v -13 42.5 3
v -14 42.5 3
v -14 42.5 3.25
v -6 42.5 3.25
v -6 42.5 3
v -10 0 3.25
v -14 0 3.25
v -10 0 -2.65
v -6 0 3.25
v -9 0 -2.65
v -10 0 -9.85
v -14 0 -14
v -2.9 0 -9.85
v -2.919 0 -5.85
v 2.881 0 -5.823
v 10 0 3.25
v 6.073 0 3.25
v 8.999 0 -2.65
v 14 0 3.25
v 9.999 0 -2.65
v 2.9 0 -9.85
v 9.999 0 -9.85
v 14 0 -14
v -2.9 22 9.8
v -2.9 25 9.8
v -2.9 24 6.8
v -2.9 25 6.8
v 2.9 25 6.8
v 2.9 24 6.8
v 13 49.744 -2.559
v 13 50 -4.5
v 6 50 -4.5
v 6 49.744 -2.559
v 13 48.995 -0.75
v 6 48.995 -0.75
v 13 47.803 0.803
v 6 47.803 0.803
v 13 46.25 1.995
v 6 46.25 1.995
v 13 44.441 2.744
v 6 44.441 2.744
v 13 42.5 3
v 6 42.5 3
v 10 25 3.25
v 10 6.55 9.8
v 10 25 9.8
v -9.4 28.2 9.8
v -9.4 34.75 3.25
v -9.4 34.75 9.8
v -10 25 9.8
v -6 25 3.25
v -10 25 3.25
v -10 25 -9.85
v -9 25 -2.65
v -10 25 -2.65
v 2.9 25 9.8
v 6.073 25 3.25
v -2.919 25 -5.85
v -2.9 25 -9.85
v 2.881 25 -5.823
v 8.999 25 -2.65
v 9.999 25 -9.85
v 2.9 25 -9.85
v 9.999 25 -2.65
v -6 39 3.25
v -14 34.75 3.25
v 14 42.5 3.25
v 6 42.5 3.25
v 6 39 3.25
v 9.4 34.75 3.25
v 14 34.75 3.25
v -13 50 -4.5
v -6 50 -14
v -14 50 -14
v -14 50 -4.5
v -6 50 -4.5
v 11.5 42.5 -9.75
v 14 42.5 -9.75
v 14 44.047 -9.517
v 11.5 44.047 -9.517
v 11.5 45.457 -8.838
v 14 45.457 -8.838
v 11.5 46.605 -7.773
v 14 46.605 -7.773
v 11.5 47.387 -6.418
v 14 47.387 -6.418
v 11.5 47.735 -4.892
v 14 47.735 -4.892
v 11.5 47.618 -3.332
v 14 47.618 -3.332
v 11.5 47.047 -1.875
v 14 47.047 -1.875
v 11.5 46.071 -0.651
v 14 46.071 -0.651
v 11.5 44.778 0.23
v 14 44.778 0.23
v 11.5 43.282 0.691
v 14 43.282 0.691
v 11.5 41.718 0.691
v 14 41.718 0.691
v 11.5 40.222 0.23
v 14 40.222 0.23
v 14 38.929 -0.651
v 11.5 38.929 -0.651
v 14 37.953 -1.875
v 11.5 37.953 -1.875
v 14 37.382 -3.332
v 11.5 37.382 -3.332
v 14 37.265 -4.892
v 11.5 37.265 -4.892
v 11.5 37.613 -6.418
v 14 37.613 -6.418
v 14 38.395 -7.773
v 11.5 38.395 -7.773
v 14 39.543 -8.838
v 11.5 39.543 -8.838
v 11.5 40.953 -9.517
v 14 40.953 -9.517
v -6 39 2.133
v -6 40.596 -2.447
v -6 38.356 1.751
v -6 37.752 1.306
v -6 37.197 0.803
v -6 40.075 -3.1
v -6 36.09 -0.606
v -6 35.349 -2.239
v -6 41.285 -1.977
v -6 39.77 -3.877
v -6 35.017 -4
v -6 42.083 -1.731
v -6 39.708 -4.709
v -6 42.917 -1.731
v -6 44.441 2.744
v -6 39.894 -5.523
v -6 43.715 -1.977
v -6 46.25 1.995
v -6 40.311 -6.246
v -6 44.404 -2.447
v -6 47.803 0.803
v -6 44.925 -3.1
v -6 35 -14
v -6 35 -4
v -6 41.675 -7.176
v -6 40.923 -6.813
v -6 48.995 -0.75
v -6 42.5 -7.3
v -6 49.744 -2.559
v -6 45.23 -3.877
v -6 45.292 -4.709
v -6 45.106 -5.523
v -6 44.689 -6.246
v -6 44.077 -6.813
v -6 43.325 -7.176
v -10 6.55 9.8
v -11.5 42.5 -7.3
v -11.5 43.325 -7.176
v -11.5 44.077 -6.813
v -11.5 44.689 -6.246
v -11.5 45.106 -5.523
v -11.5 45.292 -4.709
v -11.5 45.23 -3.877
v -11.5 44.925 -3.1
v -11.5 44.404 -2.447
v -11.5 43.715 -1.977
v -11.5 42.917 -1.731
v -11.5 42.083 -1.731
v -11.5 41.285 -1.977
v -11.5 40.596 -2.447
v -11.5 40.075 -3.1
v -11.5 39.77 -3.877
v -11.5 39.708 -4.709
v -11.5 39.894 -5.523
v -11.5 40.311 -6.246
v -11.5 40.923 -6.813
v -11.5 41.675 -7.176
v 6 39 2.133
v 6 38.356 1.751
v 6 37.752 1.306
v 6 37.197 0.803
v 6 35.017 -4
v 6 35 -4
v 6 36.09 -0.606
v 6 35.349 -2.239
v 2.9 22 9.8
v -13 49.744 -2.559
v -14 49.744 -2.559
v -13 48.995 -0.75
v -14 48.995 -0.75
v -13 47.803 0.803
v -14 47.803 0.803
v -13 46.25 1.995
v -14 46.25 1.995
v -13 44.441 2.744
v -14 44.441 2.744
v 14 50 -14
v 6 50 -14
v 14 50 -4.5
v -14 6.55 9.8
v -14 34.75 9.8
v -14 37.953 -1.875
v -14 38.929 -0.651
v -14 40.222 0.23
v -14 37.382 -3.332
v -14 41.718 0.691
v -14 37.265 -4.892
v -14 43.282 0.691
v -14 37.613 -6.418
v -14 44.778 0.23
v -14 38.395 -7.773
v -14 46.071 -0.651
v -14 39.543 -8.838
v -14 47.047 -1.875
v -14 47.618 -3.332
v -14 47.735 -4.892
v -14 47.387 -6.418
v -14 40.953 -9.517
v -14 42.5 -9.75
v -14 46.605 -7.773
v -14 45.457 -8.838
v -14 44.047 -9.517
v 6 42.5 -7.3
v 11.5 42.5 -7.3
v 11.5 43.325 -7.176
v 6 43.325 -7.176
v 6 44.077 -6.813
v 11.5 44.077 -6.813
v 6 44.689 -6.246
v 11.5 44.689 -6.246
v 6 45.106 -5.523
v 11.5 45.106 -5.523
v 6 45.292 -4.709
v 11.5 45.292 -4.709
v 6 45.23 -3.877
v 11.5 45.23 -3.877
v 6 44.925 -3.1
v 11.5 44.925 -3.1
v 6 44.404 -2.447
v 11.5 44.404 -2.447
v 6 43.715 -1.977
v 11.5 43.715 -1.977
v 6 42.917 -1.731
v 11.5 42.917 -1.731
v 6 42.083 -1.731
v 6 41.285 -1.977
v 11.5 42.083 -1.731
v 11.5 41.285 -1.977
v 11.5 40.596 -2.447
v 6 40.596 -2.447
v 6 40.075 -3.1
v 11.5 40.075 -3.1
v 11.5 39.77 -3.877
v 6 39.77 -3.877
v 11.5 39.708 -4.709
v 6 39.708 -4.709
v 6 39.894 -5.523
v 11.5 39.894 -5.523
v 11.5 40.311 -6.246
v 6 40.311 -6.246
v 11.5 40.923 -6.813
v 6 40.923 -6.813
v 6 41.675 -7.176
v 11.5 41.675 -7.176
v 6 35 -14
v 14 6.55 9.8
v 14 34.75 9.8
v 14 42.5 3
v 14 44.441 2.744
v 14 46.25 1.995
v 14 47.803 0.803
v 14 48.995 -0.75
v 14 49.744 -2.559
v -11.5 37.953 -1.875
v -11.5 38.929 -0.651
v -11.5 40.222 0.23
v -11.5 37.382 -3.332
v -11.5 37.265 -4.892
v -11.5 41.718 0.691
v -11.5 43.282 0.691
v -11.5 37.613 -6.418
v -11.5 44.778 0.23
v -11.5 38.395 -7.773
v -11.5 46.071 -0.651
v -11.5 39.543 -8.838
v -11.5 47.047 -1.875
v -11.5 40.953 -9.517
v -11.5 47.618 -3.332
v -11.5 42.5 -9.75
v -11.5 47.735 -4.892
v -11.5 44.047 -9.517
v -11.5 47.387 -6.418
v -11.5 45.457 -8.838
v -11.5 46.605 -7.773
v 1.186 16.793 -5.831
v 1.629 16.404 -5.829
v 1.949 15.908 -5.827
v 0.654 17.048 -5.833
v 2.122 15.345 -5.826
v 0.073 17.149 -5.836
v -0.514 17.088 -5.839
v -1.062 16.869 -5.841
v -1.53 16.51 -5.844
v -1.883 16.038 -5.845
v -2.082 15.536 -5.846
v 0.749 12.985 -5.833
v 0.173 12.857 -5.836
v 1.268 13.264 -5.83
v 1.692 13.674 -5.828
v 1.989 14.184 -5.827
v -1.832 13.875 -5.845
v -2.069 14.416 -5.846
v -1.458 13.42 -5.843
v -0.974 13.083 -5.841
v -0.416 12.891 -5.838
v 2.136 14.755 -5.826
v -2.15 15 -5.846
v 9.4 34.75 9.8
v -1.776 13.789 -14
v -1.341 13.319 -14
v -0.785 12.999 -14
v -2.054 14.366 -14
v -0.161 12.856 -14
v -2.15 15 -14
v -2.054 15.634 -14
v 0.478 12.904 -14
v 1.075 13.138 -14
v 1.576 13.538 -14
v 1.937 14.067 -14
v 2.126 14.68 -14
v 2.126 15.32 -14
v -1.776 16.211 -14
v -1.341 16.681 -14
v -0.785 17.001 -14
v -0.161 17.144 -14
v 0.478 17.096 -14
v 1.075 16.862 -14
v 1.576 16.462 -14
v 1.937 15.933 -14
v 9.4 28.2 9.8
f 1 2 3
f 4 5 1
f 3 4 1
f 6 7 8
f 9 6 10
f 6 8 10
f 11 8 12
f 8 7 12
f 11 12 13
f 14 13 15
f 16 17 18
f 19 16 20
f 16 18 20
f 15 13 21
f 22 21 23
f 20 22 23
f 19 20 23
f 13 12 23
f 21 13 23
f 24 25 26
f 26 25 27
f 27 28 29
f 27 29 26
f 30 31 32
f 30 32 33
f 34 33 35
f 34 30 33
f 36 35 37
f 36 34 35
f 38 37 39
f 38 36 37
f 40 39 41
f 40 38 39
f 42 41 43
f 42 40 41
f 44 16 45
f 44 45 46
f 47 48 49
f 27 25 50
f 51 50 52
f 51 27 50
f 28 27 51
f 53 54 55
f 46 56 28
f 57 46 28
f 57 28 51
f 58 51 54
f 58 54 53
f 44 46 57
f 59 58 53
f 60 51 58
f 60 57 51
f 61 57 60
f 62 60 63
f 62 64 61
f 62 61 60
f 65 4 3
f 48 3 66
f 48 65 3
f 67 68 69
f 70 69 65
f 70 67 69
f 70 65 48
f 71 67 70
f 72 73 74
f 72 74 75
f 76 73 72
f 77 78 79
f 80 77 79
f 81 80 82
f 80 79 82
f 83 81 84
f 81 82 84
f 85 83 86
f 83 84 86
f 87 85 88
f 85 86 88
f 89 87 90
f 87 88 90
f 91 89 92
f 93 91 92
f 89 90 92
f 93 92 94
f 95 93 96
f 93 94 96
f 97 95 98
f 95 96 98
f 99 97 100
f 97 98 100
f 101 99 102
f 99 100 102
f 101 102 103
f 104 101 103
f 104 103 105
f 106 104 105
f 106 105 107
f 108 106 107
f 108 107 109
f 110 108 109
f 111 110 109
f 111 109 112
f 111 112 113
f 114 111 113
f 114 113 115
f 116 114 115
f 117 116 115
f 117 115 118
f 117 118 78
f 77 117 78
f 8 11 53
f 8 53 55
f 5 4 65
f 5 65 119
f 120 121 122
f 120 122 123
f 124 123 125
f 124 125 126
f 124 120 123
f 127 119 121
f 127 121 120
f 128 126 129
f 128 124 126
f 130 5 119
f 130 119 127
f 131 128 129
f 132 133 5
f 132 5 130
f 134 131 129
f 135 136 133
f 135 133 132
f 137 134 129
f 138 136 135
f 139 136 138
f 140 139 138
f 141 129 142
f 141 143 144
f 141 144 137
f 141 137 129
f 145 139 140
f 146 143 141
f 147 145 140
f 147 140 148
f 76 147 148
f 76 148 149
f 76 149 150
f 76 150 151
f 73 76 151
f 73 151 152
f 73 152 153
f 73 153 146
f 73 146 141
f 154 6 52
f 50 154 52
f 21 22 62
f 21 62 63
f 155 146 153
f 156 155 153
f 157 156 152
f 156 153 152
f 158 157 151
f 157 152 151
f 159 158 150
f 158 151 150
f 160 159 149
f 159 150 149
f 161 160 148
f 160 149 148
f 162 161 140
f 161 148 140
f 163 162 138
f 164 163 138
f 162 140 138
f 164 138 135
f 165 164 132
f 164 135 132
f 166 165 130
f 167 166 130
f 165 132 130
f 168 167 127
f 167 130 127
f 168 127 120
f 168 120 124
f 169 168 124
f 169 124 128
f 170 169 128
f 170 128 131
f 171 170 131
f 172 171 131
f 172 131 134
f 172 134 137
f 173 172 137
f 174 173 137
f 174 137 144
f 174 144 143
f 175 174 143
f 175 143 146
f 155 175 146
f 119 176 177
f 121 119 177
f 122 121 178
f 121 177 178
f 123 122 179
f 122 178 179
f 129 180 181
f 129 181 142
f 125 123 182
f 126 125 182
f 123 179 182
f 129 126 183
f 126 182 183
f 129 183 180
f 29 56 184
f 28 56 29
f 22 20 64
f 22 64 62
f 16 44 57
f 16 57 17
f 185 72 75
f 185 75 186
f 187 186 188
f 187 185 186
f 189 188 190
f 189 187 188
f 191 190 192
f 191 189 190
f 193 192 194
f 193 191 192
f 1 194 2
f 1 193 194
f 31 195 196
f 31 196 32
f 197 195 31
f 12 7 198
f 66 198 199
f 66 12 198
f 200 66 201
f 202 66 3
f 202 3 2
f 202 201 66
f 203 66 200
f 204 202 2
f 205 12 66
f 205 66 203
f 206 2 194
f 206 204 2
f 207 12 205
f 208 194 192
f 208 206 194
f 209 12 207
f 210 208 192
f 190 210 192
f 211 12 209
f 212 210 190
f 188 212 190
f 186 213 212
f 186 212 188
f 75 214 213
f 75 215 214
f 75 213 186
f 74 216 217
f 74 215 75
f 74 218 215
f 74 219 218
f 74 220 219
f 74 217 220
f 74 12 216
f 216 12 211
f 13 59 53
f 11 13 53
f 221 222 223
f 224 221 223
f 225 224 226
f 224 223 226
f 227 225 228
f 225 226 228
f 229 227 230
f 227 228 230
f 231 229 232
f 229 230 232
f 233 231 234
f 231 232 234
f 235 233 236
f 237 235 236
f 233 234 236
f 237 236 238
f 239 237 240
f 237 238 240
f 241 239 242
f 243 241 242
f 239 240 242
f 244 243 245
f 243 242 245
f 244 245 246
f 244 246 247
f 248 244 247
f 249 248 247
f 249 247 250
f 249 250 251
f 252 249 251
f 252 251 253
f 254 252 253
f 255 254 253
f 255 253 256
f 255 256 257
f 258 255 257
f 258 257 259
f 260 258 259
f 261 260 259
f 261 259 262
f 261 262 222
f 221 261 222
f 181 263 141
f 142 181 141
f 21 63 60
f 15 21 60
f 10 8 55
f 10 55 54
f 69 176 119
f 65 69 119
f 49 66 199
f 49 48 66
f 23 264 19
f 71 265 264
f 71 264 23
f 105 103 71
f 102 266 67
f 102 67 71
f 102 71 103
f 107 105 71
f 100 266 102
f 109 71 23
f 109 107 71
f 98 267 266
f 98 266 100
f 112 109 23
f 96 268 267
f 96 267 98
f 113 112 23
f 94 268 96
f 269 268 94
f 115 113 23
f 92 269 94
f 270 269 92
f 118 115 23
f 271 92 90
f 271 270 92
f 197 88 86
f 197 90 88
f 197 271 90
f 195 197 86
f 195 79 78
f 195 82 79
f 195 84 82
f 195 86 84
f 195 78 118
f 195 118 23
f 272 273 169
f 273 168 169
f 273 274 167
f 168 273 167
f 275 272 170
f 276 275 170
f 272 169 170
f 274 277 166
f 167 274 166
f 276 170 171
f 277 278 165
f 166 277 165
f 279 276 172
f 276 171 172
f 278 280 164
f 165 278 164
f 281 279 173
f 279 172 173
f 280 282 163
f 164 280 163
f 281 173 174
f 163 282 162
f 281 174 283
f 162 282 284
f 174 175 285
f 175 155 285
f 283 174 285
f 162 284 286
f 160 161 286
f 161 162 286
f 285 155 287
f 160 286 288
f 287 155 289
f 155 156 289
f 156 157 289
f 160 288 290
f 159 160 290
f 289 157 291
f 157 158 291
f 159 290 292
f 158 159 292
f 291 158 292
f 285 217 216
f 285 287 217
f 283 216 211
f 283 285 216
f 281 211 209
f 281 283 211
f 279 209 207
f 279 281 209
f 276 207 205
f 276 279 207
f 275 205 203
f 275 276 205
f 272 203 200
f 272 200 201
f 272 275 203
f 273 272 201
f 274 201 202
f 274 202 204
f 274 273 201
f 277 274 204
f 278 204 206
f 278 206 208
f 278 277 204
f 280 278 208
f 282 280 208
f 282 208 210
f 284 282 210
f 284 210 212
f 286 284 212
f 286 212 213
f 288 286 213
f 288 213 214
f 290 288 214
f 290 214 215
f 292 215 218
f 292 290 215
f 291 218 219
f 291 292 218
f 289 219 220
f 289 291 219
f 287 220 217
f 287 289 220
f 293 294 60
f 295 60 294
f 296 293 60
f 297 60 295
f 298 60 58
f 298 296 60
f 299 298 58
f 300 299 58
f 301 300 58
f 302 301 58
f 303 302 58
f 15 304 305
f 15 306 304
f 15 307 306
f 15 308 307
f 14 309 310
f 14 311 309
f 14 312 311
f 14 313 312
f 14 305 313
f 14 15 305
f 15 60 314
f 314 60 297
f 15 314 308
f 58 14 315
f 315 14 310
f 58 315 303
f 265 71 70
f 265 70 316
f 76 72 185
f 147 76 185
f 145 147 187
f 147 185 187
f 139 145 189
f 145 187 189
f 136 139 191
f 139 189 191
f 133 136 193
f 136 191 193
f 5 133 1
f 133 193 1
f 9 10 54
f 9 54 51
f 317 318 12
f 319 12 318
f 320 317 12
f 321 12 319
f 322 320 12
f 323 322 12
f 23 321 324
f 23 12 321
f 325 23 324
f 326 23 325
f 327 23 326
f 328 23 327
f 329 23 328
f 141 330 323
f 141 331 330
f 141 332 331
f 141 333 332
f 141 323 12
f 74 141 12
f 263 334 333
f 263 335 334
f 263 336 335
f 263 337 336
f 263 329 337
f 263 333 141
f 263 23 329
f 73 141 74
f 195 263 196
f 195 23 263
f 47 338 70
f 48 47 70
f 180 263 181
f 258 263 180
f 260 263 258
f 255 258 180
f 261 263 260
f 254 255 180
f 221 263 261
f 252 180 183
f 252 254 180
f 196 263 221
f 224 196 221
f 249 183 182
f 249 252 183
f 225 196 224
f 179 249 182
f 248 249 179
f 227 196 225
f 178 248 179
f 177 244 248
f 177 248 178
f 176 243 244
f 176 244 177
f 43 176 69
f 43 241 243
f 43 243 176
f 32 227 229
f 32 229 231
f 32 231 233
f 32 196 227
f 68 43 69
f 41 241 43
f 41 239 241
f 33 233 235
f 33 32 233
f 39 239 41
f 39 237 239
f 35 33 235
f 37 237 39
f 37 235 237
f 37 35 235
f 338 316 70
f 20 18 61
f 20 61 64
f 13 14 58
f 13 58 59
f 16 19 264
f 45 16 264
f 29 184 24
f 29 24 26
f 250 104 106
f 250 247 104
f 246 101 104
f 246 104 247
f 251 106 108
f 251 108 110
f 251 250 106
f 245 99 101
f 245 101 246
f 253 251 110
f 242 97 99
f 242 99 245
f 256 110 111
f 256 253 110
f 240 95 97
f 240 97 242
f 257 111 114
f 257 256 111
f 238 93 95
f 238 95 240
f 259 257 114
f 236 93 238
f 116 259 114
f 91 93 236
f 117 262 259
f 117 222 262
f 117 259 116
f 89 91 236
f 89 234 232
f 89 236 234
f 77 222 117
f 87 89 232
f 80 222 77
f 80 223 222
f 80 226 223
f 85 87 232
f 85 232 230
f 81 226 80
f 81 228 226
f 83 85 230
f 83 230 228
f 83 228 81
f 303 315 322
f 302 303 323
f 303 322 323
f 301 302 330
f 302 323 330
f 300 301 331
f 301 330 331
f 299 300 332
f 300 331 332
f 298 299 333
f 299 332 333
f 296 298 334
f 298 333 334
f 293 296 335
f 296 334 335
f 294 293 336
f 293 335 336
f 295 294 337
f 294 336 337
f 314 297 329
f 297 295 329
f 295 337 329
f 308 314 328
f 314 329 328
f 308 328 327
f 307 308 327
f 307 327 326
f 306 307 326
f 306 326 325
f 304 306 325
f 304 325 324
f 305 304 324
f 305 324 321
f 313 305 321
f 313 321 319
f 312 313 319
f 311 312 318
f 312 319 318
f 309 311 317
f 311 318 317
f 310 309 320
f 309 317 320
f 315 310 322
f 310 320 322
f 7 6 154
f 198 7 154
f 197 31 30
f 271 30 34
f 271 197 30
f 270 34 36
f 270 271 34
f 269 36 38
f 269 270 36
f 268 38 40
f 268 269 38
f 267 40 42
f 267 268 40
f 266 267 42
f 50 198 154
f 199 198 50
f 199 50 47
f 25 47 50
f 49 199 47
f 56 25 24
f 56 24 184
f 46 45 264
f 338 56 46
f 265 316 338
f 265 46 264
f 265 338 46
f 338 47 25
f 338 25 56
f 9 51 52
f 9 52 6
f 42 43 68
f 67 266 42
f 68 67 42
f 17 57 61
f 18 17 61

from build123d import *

# Parameters (mm, degrees)
SKETCH1_W                    = 26
SKETCH1_H                    = 28
BOSS_EXTRUDE1_DEPTH          = 50
CUT_EXTRUDE6_DEPTH           = 25
CUT_EXTRUDE3_DEPTH           = 39
SKETCH14_R                   = 7.5
BOSS_EXTRUDE7_DEPTH          = 7
SKETCH15_R                   = 2.8
CUT_EXTRUDE4_DEPTH           = 28
SKETCH16_R                   = 5.25
CUT_EXTRUDE5_DEPTH           = 1.5
CUT_EXTRUDE7_DEPTH           = 54.525694764
SKETCH19_R                   = 2.15
CUT_EXTRUDE9_DEPTH           = 50
ESQUISSE1_W                  = 12
ESQUISSE1_H                  = 9.5
ENL_V_MAT_EXTRU_1_DEPTH      = 7.5
ESQUISSE3_W                  = 12
ESQUISSE3_H                  = 7.5
ENL_V_MAT_EXTRU_3_DEPTH      = 10
BOSS_EXTRU_1_DEPTH           = 26
ENL_V_MAT_EXTRU_5_DEPTH      = 3.5
ESQUISSE9_W                  = 5.8
ESQUISSE9_H                  = 3
BOSS_EXTRU_3_DEPTH           = 1
BOSS_EXTRU_4_DEPTH           = 5.8
BOSS_EXTRU_5_DEPTH           = 0.1
BOSS_EXTRU_6_DEPTH           = 0.1
ESQUISSE13_W                 = 6.55
ESQUISSE13_H                 = 9.75
BOSS_EXTRU_7_DEPTH           = 3.6
ESQUISSE14_W                 = 6.55
ESQUISSE14_H                 = 9.75
BOSS_EXTRU_8_DEPTH           = 3.6
ESQUISSE16_R                 = 5.25
BOSS_EXTRU_9_DEPTH           = 1
BOSS_EXTRU_10_START          = 1
ESQUISSE17_R                 = 5.25
BOSS_EXTRU_10_DEPTH          = 1
ESQUISSE20_W                 = 4
ESQUISSE20_H                 = 25
BOSS_EXTRU_11_DEPTH          = 6.55
ENL_V_MAT_EXTRU_6_DEPTH      = 34
ENL_V_MAT_EXTRU_6_DEPTH_BACK = 10


with BuildPart() as part:
    # Sketch1 → Boss-Extrude1 (new body)
    with BuildSketch(Plane(origin=(0, 0, 0), x_dir=(1, 0, 0), z_dir=(0, 1, 0))):
        Rectangle(SKETCH1_W, SKETCH1_H)
    extrude(amount=BOSS_EXTRUDE1_DEPTH)

    # Sketch3 → Cut-Extrude6 (cut)
    with BuildSketch(Plane(origin=(0, 0, 0), x_dir=(1, 0, 0), z_dir=(0, 1, 0))):
        Polygon((9.998973293, 2.65), (9.998973293, 9.85), (2.900254006, 9.85), (2.881158298, 5.822816277), (-2.918777792, 5.850044076), (-2.9, 9.85), (-10, 9.85), (-10, 2.65), (-9, 2.65), (-6, -3.25), (-10, -3.25), (-10, -4.35), (-10, -15.089504782), (10.190019105, -15.10204882), (10.123266065, -8.899331206), (10.068921607, -3.849623622), (10.062468516, -3.25), (6.072889948, -3.25), (8.998973293, 2.65), align=None)
    extrude(amount=CUT_EXTRUDE6_DEPTH, mode=Mode.SUBTRACT)

    # Sketch7 → Cut-Extrude3 (cut)
    with BuildSketch(Plane(origin=(13, 0, 0), x_dir=(0, 0, -1), z_dir=(1, 0, 0))):
        with BuildLine():
            Line((4.5, 50), (-14, 50))
            Line((-14, 50), (-14, 24))
            Line((-14, 24), (-0.803300859, 37.196699141))
            ThreePointArc((-0.803300859, 37.196699141), (11.429096494, 39.629874257), (4.5, 50))
        make_face()
    extrude(amount=-CUT_EXTRUDE3_DEPTH, mode=Mode.SUBTRACT)

    # Sketch14 → Boss-Extrude7 (add)
    with BuildSketch(Plane(origin=(13, 0, 0), x_dir=(0, 0, -1), z_dir=(1, 0, 0))):
        with Locations((4.5, 42.5)):
            Circle(SKETCH14_R)
    boss_extrude7 = extrude(amount=-BOSS_EXTRUDE7_DEPTH)

    # Symétrie1: Boss-Extrude7 across plane
    add(boss_extrude7.mirror(Plane(origin=(0, 0, 0), x_dir=(0, 0, 1), z_dir=(1, 0, 0))))

    # Sketch15 → Cut-Extrude4 (cut)
    with BuildSketch(Plane(origin=(13, 0, 0), x_dir=(0, 0, -1), z_dir=(1, 0, 0))):
        with Locations((4.5, 42.5)):
            Circle(SKETCH15_R)
    extrude(amount=-CUT_EXTRUDE4_DEPTH, mode=Mode.SUBTRACT)

    # Sketch16 → Cut-Extrude5 (cut)
    with BuildSketch(Plane(origin=(13, 0, 0), x_dir=(0, 0, -1), z_dir=(1, 0, 0))):
        with Locations((4.5, 42.5)):
            Circle(SKETCH16_R)
    cut_extrude5 = extrude(amount=-CUT_EXTRUDE5_DEPTH, mode=Mode.SUBTRACT)

    # Mirror3: Cut-Extrude5 across plane
    add(cut_extrude5.mirror(Plane(origin=(0, 0, 0), x_dir=(0, 0, 1), z_dir=(1, 0, 0))), mode=Mode.SUBTRACT)

    # Sketch17 → Cut-Extrude7 (cut, through all)
    with BuildSketch(Plane.XZ):
        Polygon((-9.3, 3.25), (-13, 3.25), (-13, 14), (13, 14), (13, 3.25), (9.3, 3.25), (9.3, 9.8), (-9.3, 9.8), align=None)
    extrude(amount=-CUT_EXTRUDE7_DEPTH, mode=Mode.SUBTRACT)

    # Sketch19 → Cut-Extrude9 (cut)
    with BuildSketch(Plane(origin=(0, 0, -14), x_dir=(-1, 0, 0), z_dir=(0, 0, -1))):
        with Locations((0, 15)):
            Circle(SKETCH19_R)
    extrude(amount=-CUT_EXTRUDE9_DEPTH, mode=Mode.SUBTRACT)

    # Esquisse1 → Enlèv. mat.-Extru.1 (cut)
    with BuildSketch(Plane(origin=(0, 50, 0), x_dir=(1, 0, 0), z_dir=(0, 1, 0))):
        with Locations((0, 9.25)):
            Rectangle(ESQUISSE1_W, ESQUISSE1_H)
    extrude(amount=-ENL_V_MAT_EXTRU_1_DEPTH, mode=Mode.SUBTRACT)

    # Esquisse3 → Enlèv. mat.-Extru.3 (cut)
    with BuildSketch(Plane(origin=(0, 0, -14), x_dir=(-1, 0, 0), z_dir=(0, 0, -1))):
        with Locations((0, 38.75)):
            Rectangle(ESQUISSE3_W, ESQUISSE3_H)
    extrude(amount=-ENL_V_MAT_EXTRU_3_DEPTH, mode=Mode.SUBTRACT)

    # Esquisse6 → Boss.-Extru.1 (add)
    with BuildSketch(Plane(origin=(13, 0, 0), x_dir=(0, 0, -1), z_dir=(1, 0, 0))):
        with BuildLine():
            Line((-3.25, 34.75), (-3.25, 42.5))
            Line((-3.25, 42.5), (-3, 42.5))
            ThreePointArc((-3, 42.5), (-2.429096494, 39.629874257), (-0.803300859, 37.196699141))
            Line((-0.803300859, 37.196699141), (-3.25, 34.75))
        make_face()
    extrude(amount=-BOSS_EXTRU_1_DEPTH)

    # Esquisse7 → Enlèv. mat.-Extru.5 (cut)
    with BuildSketch(Plane(origin=(0, 42.5, 0), x_dir=(1, 0, 0), z_dir=(0, 1, 0))):
        Polygon((6, 3.615864876), (6, -7.096354864), (-6, -3.780069791), (-6, 8.456914553), align=None)
    extrude(amount=-ENL_V_MAT_EXTRU_5_DEPTH, mode=Mode.SUBTRACT)

    # Esquisse9 → Boss.-Extru.3 (add)
    with BuildSketch(Plane(origin=(0, 25, 0), x_dir=(-1, 0, 0), z_dir=(0, -1, 0))):
        with Locations((0, -8.3)):
            Rectangle(ESQUISSE9_W, ESQUISSE9_H)
    extrude(amount=BOSS_EXTRU_3_DEPTH)

    # Esquisse10 → Boss.-Extru.4 (add)
    with BuildSketch(Plane.ZY.offset(2.9)):
        Polygon((9.8, 24), (9.8, 22), (6.8, 24), align=None)
    extrude(amount=-BOSS_EXTRU_4_DEPTH)

    # Esquisse11 → Boss.-Extru.5 (add)
    with BuildSketch(Plane.ZY.offset(9.3)):
        Polygon((3.25, 34.75), (9.8, 28.2), (9.8, 25), (3.25, 25), align=None)
    extrude(amount=BOSS_EXTRU_5_DEPTH)

    # Esquisse12 → Boss.-Extru.6 (add)
    with BuildSketch(Plane(origin=(9.3, 0, 0), x_dir=(0, 0, -1), z_dir=(1, 0, 0))):
        Polygon((-9.8, 25), (-9.8, 28.2), (-3.25, 34.75), (-3.25, 25), align=None)
    extrude(amount=BOSS_EXTRU_6_DEPTH)

    # Esquisse13 → Boss.-Extru.7 (add)
    with BuildSketch(Plane(origin=(9.4, 0, 0), x_dir=(0, 0, -1), z_dir=(1, 0, 0))):
        with Locations((-6.525, 29.875)):
            Rectangle(ESQUISSE13_W, ESQUISSE13_H)
    extrude(amount=BOSS_EXTRU_7_DEPTH)

    # Esquisse14 → Boss.-Extru.8 (add)
    with BuildSketch(Plane.ZY.offset(9.4)):
        with Locations((6.525, 29.875)):
            Rectangle(ESQUISSE14_W, ESQUISSE14_H)
    extrude(amount=BOSS_EXTRU_8_DEPTH)

    # Esquisse16 → Boss.-Extru.9 (add)
    with BuildSketch(Plane.ZY.offset(13)):
        with BuildLine():
            Line((3.25, 0), (-14, 0))
            Line((-14, 0), (-14, 50))
            Line((-14, 50), (-4.5, 50))
            ThreePointArc((-4.5, 50), (0.803300859, 47.803300859), (3, 42.5))
            Line((3, 42.5), (3.25, 42.5))
            Line((3.25, 42.5), (3.25, 34.75))
            Line((3.25, 34.75), (9.8, 34.75))
            Line((9.8, 34.75), (9.8, 25))
            Line((9.8, 25), (3.25, 25))
            Line((3.25, 25), (3.25, 0))
        make_face()
        with Locations(Location((-4.5, 42.5, 0), (0, 0, 180))):
            Circle(ESQUISSE16_R, mode=Mode.SUBTRACT)
    extrude(amount=BOSS_EXTRU_9_DEPTH)

    # Esquisse17 → Boss.-Extru.10 (add)
    with BuildSketch(Plane(origin=(13, 0, 0), x_dir=(0, 0, -1), z_dir=(1, 0, 0)).offset(BOSS_EXTRU_10_START)):
        with BuildLine():
            Line((-3, 42.5), (-3.25, 42.5))
            Line((-3.25, 42.5), (-3.25, 34.75))
            Line((-3.25, 34.75), (-9.8, 34.75))
            Line((-9.8, 34.75), (-9.8, 25))
            Line((-9.8, 25), (-3.25, 25))
            Line((-3.25, 25), (-3.25, 0))
            Line((-3.25, 0), (14, 0))
            Line((14, 0), (14, 50))
            Line((14, 50), (4.5, 50))
            ThreePointArc((4.5, 50), (-0.803300859, 47.803300859), (-3, 42.5))
        make_face()
        with Locations((4.5, 42.5)):
            Circle(ESQUISSE17_R, mode=Mode.SUBTRACT)
    extrude(amount=-BOSS_EXTRU_10_DEPTH)

    # Esquisse20 → Boss.-Extru.11 (add)
    with BuildSketch(Plane.XY.offset(3.25)):
        with Locations((-12, 12.5)):
            Rectangle(ESQUISSE20_W, ESQUISSE20_H)
        with Locations((12, 12.5)):
            Rectangle(ESQUISSE20_W, ESQUISSE20_H)
    extrude(amount=BOSS_EXTRU_11_DEPTH)

    # Esquisse22 → Enlèv. mat.-Extru.6 (cut, two sides: drawn at the far end of the back side and taken through both)
    with BuildSketch(Plane.ZY.offset(-10).offset(-ENL_V_MAT_EXTRU_6_DEPTH_BACK)):
        Polygon((3.25, 0), (9.8, 6.55), (13.122553289, -3.826398857), (3.25, -3.616824535), align=None)
    extrude(amount=ENL_V_MAT_EXTRU_6_DEPTH + ENL_V_MAT_EXTRU_6_DEPTH_BACK, mode=Mode.SUBTRACT)


solid = part.part
